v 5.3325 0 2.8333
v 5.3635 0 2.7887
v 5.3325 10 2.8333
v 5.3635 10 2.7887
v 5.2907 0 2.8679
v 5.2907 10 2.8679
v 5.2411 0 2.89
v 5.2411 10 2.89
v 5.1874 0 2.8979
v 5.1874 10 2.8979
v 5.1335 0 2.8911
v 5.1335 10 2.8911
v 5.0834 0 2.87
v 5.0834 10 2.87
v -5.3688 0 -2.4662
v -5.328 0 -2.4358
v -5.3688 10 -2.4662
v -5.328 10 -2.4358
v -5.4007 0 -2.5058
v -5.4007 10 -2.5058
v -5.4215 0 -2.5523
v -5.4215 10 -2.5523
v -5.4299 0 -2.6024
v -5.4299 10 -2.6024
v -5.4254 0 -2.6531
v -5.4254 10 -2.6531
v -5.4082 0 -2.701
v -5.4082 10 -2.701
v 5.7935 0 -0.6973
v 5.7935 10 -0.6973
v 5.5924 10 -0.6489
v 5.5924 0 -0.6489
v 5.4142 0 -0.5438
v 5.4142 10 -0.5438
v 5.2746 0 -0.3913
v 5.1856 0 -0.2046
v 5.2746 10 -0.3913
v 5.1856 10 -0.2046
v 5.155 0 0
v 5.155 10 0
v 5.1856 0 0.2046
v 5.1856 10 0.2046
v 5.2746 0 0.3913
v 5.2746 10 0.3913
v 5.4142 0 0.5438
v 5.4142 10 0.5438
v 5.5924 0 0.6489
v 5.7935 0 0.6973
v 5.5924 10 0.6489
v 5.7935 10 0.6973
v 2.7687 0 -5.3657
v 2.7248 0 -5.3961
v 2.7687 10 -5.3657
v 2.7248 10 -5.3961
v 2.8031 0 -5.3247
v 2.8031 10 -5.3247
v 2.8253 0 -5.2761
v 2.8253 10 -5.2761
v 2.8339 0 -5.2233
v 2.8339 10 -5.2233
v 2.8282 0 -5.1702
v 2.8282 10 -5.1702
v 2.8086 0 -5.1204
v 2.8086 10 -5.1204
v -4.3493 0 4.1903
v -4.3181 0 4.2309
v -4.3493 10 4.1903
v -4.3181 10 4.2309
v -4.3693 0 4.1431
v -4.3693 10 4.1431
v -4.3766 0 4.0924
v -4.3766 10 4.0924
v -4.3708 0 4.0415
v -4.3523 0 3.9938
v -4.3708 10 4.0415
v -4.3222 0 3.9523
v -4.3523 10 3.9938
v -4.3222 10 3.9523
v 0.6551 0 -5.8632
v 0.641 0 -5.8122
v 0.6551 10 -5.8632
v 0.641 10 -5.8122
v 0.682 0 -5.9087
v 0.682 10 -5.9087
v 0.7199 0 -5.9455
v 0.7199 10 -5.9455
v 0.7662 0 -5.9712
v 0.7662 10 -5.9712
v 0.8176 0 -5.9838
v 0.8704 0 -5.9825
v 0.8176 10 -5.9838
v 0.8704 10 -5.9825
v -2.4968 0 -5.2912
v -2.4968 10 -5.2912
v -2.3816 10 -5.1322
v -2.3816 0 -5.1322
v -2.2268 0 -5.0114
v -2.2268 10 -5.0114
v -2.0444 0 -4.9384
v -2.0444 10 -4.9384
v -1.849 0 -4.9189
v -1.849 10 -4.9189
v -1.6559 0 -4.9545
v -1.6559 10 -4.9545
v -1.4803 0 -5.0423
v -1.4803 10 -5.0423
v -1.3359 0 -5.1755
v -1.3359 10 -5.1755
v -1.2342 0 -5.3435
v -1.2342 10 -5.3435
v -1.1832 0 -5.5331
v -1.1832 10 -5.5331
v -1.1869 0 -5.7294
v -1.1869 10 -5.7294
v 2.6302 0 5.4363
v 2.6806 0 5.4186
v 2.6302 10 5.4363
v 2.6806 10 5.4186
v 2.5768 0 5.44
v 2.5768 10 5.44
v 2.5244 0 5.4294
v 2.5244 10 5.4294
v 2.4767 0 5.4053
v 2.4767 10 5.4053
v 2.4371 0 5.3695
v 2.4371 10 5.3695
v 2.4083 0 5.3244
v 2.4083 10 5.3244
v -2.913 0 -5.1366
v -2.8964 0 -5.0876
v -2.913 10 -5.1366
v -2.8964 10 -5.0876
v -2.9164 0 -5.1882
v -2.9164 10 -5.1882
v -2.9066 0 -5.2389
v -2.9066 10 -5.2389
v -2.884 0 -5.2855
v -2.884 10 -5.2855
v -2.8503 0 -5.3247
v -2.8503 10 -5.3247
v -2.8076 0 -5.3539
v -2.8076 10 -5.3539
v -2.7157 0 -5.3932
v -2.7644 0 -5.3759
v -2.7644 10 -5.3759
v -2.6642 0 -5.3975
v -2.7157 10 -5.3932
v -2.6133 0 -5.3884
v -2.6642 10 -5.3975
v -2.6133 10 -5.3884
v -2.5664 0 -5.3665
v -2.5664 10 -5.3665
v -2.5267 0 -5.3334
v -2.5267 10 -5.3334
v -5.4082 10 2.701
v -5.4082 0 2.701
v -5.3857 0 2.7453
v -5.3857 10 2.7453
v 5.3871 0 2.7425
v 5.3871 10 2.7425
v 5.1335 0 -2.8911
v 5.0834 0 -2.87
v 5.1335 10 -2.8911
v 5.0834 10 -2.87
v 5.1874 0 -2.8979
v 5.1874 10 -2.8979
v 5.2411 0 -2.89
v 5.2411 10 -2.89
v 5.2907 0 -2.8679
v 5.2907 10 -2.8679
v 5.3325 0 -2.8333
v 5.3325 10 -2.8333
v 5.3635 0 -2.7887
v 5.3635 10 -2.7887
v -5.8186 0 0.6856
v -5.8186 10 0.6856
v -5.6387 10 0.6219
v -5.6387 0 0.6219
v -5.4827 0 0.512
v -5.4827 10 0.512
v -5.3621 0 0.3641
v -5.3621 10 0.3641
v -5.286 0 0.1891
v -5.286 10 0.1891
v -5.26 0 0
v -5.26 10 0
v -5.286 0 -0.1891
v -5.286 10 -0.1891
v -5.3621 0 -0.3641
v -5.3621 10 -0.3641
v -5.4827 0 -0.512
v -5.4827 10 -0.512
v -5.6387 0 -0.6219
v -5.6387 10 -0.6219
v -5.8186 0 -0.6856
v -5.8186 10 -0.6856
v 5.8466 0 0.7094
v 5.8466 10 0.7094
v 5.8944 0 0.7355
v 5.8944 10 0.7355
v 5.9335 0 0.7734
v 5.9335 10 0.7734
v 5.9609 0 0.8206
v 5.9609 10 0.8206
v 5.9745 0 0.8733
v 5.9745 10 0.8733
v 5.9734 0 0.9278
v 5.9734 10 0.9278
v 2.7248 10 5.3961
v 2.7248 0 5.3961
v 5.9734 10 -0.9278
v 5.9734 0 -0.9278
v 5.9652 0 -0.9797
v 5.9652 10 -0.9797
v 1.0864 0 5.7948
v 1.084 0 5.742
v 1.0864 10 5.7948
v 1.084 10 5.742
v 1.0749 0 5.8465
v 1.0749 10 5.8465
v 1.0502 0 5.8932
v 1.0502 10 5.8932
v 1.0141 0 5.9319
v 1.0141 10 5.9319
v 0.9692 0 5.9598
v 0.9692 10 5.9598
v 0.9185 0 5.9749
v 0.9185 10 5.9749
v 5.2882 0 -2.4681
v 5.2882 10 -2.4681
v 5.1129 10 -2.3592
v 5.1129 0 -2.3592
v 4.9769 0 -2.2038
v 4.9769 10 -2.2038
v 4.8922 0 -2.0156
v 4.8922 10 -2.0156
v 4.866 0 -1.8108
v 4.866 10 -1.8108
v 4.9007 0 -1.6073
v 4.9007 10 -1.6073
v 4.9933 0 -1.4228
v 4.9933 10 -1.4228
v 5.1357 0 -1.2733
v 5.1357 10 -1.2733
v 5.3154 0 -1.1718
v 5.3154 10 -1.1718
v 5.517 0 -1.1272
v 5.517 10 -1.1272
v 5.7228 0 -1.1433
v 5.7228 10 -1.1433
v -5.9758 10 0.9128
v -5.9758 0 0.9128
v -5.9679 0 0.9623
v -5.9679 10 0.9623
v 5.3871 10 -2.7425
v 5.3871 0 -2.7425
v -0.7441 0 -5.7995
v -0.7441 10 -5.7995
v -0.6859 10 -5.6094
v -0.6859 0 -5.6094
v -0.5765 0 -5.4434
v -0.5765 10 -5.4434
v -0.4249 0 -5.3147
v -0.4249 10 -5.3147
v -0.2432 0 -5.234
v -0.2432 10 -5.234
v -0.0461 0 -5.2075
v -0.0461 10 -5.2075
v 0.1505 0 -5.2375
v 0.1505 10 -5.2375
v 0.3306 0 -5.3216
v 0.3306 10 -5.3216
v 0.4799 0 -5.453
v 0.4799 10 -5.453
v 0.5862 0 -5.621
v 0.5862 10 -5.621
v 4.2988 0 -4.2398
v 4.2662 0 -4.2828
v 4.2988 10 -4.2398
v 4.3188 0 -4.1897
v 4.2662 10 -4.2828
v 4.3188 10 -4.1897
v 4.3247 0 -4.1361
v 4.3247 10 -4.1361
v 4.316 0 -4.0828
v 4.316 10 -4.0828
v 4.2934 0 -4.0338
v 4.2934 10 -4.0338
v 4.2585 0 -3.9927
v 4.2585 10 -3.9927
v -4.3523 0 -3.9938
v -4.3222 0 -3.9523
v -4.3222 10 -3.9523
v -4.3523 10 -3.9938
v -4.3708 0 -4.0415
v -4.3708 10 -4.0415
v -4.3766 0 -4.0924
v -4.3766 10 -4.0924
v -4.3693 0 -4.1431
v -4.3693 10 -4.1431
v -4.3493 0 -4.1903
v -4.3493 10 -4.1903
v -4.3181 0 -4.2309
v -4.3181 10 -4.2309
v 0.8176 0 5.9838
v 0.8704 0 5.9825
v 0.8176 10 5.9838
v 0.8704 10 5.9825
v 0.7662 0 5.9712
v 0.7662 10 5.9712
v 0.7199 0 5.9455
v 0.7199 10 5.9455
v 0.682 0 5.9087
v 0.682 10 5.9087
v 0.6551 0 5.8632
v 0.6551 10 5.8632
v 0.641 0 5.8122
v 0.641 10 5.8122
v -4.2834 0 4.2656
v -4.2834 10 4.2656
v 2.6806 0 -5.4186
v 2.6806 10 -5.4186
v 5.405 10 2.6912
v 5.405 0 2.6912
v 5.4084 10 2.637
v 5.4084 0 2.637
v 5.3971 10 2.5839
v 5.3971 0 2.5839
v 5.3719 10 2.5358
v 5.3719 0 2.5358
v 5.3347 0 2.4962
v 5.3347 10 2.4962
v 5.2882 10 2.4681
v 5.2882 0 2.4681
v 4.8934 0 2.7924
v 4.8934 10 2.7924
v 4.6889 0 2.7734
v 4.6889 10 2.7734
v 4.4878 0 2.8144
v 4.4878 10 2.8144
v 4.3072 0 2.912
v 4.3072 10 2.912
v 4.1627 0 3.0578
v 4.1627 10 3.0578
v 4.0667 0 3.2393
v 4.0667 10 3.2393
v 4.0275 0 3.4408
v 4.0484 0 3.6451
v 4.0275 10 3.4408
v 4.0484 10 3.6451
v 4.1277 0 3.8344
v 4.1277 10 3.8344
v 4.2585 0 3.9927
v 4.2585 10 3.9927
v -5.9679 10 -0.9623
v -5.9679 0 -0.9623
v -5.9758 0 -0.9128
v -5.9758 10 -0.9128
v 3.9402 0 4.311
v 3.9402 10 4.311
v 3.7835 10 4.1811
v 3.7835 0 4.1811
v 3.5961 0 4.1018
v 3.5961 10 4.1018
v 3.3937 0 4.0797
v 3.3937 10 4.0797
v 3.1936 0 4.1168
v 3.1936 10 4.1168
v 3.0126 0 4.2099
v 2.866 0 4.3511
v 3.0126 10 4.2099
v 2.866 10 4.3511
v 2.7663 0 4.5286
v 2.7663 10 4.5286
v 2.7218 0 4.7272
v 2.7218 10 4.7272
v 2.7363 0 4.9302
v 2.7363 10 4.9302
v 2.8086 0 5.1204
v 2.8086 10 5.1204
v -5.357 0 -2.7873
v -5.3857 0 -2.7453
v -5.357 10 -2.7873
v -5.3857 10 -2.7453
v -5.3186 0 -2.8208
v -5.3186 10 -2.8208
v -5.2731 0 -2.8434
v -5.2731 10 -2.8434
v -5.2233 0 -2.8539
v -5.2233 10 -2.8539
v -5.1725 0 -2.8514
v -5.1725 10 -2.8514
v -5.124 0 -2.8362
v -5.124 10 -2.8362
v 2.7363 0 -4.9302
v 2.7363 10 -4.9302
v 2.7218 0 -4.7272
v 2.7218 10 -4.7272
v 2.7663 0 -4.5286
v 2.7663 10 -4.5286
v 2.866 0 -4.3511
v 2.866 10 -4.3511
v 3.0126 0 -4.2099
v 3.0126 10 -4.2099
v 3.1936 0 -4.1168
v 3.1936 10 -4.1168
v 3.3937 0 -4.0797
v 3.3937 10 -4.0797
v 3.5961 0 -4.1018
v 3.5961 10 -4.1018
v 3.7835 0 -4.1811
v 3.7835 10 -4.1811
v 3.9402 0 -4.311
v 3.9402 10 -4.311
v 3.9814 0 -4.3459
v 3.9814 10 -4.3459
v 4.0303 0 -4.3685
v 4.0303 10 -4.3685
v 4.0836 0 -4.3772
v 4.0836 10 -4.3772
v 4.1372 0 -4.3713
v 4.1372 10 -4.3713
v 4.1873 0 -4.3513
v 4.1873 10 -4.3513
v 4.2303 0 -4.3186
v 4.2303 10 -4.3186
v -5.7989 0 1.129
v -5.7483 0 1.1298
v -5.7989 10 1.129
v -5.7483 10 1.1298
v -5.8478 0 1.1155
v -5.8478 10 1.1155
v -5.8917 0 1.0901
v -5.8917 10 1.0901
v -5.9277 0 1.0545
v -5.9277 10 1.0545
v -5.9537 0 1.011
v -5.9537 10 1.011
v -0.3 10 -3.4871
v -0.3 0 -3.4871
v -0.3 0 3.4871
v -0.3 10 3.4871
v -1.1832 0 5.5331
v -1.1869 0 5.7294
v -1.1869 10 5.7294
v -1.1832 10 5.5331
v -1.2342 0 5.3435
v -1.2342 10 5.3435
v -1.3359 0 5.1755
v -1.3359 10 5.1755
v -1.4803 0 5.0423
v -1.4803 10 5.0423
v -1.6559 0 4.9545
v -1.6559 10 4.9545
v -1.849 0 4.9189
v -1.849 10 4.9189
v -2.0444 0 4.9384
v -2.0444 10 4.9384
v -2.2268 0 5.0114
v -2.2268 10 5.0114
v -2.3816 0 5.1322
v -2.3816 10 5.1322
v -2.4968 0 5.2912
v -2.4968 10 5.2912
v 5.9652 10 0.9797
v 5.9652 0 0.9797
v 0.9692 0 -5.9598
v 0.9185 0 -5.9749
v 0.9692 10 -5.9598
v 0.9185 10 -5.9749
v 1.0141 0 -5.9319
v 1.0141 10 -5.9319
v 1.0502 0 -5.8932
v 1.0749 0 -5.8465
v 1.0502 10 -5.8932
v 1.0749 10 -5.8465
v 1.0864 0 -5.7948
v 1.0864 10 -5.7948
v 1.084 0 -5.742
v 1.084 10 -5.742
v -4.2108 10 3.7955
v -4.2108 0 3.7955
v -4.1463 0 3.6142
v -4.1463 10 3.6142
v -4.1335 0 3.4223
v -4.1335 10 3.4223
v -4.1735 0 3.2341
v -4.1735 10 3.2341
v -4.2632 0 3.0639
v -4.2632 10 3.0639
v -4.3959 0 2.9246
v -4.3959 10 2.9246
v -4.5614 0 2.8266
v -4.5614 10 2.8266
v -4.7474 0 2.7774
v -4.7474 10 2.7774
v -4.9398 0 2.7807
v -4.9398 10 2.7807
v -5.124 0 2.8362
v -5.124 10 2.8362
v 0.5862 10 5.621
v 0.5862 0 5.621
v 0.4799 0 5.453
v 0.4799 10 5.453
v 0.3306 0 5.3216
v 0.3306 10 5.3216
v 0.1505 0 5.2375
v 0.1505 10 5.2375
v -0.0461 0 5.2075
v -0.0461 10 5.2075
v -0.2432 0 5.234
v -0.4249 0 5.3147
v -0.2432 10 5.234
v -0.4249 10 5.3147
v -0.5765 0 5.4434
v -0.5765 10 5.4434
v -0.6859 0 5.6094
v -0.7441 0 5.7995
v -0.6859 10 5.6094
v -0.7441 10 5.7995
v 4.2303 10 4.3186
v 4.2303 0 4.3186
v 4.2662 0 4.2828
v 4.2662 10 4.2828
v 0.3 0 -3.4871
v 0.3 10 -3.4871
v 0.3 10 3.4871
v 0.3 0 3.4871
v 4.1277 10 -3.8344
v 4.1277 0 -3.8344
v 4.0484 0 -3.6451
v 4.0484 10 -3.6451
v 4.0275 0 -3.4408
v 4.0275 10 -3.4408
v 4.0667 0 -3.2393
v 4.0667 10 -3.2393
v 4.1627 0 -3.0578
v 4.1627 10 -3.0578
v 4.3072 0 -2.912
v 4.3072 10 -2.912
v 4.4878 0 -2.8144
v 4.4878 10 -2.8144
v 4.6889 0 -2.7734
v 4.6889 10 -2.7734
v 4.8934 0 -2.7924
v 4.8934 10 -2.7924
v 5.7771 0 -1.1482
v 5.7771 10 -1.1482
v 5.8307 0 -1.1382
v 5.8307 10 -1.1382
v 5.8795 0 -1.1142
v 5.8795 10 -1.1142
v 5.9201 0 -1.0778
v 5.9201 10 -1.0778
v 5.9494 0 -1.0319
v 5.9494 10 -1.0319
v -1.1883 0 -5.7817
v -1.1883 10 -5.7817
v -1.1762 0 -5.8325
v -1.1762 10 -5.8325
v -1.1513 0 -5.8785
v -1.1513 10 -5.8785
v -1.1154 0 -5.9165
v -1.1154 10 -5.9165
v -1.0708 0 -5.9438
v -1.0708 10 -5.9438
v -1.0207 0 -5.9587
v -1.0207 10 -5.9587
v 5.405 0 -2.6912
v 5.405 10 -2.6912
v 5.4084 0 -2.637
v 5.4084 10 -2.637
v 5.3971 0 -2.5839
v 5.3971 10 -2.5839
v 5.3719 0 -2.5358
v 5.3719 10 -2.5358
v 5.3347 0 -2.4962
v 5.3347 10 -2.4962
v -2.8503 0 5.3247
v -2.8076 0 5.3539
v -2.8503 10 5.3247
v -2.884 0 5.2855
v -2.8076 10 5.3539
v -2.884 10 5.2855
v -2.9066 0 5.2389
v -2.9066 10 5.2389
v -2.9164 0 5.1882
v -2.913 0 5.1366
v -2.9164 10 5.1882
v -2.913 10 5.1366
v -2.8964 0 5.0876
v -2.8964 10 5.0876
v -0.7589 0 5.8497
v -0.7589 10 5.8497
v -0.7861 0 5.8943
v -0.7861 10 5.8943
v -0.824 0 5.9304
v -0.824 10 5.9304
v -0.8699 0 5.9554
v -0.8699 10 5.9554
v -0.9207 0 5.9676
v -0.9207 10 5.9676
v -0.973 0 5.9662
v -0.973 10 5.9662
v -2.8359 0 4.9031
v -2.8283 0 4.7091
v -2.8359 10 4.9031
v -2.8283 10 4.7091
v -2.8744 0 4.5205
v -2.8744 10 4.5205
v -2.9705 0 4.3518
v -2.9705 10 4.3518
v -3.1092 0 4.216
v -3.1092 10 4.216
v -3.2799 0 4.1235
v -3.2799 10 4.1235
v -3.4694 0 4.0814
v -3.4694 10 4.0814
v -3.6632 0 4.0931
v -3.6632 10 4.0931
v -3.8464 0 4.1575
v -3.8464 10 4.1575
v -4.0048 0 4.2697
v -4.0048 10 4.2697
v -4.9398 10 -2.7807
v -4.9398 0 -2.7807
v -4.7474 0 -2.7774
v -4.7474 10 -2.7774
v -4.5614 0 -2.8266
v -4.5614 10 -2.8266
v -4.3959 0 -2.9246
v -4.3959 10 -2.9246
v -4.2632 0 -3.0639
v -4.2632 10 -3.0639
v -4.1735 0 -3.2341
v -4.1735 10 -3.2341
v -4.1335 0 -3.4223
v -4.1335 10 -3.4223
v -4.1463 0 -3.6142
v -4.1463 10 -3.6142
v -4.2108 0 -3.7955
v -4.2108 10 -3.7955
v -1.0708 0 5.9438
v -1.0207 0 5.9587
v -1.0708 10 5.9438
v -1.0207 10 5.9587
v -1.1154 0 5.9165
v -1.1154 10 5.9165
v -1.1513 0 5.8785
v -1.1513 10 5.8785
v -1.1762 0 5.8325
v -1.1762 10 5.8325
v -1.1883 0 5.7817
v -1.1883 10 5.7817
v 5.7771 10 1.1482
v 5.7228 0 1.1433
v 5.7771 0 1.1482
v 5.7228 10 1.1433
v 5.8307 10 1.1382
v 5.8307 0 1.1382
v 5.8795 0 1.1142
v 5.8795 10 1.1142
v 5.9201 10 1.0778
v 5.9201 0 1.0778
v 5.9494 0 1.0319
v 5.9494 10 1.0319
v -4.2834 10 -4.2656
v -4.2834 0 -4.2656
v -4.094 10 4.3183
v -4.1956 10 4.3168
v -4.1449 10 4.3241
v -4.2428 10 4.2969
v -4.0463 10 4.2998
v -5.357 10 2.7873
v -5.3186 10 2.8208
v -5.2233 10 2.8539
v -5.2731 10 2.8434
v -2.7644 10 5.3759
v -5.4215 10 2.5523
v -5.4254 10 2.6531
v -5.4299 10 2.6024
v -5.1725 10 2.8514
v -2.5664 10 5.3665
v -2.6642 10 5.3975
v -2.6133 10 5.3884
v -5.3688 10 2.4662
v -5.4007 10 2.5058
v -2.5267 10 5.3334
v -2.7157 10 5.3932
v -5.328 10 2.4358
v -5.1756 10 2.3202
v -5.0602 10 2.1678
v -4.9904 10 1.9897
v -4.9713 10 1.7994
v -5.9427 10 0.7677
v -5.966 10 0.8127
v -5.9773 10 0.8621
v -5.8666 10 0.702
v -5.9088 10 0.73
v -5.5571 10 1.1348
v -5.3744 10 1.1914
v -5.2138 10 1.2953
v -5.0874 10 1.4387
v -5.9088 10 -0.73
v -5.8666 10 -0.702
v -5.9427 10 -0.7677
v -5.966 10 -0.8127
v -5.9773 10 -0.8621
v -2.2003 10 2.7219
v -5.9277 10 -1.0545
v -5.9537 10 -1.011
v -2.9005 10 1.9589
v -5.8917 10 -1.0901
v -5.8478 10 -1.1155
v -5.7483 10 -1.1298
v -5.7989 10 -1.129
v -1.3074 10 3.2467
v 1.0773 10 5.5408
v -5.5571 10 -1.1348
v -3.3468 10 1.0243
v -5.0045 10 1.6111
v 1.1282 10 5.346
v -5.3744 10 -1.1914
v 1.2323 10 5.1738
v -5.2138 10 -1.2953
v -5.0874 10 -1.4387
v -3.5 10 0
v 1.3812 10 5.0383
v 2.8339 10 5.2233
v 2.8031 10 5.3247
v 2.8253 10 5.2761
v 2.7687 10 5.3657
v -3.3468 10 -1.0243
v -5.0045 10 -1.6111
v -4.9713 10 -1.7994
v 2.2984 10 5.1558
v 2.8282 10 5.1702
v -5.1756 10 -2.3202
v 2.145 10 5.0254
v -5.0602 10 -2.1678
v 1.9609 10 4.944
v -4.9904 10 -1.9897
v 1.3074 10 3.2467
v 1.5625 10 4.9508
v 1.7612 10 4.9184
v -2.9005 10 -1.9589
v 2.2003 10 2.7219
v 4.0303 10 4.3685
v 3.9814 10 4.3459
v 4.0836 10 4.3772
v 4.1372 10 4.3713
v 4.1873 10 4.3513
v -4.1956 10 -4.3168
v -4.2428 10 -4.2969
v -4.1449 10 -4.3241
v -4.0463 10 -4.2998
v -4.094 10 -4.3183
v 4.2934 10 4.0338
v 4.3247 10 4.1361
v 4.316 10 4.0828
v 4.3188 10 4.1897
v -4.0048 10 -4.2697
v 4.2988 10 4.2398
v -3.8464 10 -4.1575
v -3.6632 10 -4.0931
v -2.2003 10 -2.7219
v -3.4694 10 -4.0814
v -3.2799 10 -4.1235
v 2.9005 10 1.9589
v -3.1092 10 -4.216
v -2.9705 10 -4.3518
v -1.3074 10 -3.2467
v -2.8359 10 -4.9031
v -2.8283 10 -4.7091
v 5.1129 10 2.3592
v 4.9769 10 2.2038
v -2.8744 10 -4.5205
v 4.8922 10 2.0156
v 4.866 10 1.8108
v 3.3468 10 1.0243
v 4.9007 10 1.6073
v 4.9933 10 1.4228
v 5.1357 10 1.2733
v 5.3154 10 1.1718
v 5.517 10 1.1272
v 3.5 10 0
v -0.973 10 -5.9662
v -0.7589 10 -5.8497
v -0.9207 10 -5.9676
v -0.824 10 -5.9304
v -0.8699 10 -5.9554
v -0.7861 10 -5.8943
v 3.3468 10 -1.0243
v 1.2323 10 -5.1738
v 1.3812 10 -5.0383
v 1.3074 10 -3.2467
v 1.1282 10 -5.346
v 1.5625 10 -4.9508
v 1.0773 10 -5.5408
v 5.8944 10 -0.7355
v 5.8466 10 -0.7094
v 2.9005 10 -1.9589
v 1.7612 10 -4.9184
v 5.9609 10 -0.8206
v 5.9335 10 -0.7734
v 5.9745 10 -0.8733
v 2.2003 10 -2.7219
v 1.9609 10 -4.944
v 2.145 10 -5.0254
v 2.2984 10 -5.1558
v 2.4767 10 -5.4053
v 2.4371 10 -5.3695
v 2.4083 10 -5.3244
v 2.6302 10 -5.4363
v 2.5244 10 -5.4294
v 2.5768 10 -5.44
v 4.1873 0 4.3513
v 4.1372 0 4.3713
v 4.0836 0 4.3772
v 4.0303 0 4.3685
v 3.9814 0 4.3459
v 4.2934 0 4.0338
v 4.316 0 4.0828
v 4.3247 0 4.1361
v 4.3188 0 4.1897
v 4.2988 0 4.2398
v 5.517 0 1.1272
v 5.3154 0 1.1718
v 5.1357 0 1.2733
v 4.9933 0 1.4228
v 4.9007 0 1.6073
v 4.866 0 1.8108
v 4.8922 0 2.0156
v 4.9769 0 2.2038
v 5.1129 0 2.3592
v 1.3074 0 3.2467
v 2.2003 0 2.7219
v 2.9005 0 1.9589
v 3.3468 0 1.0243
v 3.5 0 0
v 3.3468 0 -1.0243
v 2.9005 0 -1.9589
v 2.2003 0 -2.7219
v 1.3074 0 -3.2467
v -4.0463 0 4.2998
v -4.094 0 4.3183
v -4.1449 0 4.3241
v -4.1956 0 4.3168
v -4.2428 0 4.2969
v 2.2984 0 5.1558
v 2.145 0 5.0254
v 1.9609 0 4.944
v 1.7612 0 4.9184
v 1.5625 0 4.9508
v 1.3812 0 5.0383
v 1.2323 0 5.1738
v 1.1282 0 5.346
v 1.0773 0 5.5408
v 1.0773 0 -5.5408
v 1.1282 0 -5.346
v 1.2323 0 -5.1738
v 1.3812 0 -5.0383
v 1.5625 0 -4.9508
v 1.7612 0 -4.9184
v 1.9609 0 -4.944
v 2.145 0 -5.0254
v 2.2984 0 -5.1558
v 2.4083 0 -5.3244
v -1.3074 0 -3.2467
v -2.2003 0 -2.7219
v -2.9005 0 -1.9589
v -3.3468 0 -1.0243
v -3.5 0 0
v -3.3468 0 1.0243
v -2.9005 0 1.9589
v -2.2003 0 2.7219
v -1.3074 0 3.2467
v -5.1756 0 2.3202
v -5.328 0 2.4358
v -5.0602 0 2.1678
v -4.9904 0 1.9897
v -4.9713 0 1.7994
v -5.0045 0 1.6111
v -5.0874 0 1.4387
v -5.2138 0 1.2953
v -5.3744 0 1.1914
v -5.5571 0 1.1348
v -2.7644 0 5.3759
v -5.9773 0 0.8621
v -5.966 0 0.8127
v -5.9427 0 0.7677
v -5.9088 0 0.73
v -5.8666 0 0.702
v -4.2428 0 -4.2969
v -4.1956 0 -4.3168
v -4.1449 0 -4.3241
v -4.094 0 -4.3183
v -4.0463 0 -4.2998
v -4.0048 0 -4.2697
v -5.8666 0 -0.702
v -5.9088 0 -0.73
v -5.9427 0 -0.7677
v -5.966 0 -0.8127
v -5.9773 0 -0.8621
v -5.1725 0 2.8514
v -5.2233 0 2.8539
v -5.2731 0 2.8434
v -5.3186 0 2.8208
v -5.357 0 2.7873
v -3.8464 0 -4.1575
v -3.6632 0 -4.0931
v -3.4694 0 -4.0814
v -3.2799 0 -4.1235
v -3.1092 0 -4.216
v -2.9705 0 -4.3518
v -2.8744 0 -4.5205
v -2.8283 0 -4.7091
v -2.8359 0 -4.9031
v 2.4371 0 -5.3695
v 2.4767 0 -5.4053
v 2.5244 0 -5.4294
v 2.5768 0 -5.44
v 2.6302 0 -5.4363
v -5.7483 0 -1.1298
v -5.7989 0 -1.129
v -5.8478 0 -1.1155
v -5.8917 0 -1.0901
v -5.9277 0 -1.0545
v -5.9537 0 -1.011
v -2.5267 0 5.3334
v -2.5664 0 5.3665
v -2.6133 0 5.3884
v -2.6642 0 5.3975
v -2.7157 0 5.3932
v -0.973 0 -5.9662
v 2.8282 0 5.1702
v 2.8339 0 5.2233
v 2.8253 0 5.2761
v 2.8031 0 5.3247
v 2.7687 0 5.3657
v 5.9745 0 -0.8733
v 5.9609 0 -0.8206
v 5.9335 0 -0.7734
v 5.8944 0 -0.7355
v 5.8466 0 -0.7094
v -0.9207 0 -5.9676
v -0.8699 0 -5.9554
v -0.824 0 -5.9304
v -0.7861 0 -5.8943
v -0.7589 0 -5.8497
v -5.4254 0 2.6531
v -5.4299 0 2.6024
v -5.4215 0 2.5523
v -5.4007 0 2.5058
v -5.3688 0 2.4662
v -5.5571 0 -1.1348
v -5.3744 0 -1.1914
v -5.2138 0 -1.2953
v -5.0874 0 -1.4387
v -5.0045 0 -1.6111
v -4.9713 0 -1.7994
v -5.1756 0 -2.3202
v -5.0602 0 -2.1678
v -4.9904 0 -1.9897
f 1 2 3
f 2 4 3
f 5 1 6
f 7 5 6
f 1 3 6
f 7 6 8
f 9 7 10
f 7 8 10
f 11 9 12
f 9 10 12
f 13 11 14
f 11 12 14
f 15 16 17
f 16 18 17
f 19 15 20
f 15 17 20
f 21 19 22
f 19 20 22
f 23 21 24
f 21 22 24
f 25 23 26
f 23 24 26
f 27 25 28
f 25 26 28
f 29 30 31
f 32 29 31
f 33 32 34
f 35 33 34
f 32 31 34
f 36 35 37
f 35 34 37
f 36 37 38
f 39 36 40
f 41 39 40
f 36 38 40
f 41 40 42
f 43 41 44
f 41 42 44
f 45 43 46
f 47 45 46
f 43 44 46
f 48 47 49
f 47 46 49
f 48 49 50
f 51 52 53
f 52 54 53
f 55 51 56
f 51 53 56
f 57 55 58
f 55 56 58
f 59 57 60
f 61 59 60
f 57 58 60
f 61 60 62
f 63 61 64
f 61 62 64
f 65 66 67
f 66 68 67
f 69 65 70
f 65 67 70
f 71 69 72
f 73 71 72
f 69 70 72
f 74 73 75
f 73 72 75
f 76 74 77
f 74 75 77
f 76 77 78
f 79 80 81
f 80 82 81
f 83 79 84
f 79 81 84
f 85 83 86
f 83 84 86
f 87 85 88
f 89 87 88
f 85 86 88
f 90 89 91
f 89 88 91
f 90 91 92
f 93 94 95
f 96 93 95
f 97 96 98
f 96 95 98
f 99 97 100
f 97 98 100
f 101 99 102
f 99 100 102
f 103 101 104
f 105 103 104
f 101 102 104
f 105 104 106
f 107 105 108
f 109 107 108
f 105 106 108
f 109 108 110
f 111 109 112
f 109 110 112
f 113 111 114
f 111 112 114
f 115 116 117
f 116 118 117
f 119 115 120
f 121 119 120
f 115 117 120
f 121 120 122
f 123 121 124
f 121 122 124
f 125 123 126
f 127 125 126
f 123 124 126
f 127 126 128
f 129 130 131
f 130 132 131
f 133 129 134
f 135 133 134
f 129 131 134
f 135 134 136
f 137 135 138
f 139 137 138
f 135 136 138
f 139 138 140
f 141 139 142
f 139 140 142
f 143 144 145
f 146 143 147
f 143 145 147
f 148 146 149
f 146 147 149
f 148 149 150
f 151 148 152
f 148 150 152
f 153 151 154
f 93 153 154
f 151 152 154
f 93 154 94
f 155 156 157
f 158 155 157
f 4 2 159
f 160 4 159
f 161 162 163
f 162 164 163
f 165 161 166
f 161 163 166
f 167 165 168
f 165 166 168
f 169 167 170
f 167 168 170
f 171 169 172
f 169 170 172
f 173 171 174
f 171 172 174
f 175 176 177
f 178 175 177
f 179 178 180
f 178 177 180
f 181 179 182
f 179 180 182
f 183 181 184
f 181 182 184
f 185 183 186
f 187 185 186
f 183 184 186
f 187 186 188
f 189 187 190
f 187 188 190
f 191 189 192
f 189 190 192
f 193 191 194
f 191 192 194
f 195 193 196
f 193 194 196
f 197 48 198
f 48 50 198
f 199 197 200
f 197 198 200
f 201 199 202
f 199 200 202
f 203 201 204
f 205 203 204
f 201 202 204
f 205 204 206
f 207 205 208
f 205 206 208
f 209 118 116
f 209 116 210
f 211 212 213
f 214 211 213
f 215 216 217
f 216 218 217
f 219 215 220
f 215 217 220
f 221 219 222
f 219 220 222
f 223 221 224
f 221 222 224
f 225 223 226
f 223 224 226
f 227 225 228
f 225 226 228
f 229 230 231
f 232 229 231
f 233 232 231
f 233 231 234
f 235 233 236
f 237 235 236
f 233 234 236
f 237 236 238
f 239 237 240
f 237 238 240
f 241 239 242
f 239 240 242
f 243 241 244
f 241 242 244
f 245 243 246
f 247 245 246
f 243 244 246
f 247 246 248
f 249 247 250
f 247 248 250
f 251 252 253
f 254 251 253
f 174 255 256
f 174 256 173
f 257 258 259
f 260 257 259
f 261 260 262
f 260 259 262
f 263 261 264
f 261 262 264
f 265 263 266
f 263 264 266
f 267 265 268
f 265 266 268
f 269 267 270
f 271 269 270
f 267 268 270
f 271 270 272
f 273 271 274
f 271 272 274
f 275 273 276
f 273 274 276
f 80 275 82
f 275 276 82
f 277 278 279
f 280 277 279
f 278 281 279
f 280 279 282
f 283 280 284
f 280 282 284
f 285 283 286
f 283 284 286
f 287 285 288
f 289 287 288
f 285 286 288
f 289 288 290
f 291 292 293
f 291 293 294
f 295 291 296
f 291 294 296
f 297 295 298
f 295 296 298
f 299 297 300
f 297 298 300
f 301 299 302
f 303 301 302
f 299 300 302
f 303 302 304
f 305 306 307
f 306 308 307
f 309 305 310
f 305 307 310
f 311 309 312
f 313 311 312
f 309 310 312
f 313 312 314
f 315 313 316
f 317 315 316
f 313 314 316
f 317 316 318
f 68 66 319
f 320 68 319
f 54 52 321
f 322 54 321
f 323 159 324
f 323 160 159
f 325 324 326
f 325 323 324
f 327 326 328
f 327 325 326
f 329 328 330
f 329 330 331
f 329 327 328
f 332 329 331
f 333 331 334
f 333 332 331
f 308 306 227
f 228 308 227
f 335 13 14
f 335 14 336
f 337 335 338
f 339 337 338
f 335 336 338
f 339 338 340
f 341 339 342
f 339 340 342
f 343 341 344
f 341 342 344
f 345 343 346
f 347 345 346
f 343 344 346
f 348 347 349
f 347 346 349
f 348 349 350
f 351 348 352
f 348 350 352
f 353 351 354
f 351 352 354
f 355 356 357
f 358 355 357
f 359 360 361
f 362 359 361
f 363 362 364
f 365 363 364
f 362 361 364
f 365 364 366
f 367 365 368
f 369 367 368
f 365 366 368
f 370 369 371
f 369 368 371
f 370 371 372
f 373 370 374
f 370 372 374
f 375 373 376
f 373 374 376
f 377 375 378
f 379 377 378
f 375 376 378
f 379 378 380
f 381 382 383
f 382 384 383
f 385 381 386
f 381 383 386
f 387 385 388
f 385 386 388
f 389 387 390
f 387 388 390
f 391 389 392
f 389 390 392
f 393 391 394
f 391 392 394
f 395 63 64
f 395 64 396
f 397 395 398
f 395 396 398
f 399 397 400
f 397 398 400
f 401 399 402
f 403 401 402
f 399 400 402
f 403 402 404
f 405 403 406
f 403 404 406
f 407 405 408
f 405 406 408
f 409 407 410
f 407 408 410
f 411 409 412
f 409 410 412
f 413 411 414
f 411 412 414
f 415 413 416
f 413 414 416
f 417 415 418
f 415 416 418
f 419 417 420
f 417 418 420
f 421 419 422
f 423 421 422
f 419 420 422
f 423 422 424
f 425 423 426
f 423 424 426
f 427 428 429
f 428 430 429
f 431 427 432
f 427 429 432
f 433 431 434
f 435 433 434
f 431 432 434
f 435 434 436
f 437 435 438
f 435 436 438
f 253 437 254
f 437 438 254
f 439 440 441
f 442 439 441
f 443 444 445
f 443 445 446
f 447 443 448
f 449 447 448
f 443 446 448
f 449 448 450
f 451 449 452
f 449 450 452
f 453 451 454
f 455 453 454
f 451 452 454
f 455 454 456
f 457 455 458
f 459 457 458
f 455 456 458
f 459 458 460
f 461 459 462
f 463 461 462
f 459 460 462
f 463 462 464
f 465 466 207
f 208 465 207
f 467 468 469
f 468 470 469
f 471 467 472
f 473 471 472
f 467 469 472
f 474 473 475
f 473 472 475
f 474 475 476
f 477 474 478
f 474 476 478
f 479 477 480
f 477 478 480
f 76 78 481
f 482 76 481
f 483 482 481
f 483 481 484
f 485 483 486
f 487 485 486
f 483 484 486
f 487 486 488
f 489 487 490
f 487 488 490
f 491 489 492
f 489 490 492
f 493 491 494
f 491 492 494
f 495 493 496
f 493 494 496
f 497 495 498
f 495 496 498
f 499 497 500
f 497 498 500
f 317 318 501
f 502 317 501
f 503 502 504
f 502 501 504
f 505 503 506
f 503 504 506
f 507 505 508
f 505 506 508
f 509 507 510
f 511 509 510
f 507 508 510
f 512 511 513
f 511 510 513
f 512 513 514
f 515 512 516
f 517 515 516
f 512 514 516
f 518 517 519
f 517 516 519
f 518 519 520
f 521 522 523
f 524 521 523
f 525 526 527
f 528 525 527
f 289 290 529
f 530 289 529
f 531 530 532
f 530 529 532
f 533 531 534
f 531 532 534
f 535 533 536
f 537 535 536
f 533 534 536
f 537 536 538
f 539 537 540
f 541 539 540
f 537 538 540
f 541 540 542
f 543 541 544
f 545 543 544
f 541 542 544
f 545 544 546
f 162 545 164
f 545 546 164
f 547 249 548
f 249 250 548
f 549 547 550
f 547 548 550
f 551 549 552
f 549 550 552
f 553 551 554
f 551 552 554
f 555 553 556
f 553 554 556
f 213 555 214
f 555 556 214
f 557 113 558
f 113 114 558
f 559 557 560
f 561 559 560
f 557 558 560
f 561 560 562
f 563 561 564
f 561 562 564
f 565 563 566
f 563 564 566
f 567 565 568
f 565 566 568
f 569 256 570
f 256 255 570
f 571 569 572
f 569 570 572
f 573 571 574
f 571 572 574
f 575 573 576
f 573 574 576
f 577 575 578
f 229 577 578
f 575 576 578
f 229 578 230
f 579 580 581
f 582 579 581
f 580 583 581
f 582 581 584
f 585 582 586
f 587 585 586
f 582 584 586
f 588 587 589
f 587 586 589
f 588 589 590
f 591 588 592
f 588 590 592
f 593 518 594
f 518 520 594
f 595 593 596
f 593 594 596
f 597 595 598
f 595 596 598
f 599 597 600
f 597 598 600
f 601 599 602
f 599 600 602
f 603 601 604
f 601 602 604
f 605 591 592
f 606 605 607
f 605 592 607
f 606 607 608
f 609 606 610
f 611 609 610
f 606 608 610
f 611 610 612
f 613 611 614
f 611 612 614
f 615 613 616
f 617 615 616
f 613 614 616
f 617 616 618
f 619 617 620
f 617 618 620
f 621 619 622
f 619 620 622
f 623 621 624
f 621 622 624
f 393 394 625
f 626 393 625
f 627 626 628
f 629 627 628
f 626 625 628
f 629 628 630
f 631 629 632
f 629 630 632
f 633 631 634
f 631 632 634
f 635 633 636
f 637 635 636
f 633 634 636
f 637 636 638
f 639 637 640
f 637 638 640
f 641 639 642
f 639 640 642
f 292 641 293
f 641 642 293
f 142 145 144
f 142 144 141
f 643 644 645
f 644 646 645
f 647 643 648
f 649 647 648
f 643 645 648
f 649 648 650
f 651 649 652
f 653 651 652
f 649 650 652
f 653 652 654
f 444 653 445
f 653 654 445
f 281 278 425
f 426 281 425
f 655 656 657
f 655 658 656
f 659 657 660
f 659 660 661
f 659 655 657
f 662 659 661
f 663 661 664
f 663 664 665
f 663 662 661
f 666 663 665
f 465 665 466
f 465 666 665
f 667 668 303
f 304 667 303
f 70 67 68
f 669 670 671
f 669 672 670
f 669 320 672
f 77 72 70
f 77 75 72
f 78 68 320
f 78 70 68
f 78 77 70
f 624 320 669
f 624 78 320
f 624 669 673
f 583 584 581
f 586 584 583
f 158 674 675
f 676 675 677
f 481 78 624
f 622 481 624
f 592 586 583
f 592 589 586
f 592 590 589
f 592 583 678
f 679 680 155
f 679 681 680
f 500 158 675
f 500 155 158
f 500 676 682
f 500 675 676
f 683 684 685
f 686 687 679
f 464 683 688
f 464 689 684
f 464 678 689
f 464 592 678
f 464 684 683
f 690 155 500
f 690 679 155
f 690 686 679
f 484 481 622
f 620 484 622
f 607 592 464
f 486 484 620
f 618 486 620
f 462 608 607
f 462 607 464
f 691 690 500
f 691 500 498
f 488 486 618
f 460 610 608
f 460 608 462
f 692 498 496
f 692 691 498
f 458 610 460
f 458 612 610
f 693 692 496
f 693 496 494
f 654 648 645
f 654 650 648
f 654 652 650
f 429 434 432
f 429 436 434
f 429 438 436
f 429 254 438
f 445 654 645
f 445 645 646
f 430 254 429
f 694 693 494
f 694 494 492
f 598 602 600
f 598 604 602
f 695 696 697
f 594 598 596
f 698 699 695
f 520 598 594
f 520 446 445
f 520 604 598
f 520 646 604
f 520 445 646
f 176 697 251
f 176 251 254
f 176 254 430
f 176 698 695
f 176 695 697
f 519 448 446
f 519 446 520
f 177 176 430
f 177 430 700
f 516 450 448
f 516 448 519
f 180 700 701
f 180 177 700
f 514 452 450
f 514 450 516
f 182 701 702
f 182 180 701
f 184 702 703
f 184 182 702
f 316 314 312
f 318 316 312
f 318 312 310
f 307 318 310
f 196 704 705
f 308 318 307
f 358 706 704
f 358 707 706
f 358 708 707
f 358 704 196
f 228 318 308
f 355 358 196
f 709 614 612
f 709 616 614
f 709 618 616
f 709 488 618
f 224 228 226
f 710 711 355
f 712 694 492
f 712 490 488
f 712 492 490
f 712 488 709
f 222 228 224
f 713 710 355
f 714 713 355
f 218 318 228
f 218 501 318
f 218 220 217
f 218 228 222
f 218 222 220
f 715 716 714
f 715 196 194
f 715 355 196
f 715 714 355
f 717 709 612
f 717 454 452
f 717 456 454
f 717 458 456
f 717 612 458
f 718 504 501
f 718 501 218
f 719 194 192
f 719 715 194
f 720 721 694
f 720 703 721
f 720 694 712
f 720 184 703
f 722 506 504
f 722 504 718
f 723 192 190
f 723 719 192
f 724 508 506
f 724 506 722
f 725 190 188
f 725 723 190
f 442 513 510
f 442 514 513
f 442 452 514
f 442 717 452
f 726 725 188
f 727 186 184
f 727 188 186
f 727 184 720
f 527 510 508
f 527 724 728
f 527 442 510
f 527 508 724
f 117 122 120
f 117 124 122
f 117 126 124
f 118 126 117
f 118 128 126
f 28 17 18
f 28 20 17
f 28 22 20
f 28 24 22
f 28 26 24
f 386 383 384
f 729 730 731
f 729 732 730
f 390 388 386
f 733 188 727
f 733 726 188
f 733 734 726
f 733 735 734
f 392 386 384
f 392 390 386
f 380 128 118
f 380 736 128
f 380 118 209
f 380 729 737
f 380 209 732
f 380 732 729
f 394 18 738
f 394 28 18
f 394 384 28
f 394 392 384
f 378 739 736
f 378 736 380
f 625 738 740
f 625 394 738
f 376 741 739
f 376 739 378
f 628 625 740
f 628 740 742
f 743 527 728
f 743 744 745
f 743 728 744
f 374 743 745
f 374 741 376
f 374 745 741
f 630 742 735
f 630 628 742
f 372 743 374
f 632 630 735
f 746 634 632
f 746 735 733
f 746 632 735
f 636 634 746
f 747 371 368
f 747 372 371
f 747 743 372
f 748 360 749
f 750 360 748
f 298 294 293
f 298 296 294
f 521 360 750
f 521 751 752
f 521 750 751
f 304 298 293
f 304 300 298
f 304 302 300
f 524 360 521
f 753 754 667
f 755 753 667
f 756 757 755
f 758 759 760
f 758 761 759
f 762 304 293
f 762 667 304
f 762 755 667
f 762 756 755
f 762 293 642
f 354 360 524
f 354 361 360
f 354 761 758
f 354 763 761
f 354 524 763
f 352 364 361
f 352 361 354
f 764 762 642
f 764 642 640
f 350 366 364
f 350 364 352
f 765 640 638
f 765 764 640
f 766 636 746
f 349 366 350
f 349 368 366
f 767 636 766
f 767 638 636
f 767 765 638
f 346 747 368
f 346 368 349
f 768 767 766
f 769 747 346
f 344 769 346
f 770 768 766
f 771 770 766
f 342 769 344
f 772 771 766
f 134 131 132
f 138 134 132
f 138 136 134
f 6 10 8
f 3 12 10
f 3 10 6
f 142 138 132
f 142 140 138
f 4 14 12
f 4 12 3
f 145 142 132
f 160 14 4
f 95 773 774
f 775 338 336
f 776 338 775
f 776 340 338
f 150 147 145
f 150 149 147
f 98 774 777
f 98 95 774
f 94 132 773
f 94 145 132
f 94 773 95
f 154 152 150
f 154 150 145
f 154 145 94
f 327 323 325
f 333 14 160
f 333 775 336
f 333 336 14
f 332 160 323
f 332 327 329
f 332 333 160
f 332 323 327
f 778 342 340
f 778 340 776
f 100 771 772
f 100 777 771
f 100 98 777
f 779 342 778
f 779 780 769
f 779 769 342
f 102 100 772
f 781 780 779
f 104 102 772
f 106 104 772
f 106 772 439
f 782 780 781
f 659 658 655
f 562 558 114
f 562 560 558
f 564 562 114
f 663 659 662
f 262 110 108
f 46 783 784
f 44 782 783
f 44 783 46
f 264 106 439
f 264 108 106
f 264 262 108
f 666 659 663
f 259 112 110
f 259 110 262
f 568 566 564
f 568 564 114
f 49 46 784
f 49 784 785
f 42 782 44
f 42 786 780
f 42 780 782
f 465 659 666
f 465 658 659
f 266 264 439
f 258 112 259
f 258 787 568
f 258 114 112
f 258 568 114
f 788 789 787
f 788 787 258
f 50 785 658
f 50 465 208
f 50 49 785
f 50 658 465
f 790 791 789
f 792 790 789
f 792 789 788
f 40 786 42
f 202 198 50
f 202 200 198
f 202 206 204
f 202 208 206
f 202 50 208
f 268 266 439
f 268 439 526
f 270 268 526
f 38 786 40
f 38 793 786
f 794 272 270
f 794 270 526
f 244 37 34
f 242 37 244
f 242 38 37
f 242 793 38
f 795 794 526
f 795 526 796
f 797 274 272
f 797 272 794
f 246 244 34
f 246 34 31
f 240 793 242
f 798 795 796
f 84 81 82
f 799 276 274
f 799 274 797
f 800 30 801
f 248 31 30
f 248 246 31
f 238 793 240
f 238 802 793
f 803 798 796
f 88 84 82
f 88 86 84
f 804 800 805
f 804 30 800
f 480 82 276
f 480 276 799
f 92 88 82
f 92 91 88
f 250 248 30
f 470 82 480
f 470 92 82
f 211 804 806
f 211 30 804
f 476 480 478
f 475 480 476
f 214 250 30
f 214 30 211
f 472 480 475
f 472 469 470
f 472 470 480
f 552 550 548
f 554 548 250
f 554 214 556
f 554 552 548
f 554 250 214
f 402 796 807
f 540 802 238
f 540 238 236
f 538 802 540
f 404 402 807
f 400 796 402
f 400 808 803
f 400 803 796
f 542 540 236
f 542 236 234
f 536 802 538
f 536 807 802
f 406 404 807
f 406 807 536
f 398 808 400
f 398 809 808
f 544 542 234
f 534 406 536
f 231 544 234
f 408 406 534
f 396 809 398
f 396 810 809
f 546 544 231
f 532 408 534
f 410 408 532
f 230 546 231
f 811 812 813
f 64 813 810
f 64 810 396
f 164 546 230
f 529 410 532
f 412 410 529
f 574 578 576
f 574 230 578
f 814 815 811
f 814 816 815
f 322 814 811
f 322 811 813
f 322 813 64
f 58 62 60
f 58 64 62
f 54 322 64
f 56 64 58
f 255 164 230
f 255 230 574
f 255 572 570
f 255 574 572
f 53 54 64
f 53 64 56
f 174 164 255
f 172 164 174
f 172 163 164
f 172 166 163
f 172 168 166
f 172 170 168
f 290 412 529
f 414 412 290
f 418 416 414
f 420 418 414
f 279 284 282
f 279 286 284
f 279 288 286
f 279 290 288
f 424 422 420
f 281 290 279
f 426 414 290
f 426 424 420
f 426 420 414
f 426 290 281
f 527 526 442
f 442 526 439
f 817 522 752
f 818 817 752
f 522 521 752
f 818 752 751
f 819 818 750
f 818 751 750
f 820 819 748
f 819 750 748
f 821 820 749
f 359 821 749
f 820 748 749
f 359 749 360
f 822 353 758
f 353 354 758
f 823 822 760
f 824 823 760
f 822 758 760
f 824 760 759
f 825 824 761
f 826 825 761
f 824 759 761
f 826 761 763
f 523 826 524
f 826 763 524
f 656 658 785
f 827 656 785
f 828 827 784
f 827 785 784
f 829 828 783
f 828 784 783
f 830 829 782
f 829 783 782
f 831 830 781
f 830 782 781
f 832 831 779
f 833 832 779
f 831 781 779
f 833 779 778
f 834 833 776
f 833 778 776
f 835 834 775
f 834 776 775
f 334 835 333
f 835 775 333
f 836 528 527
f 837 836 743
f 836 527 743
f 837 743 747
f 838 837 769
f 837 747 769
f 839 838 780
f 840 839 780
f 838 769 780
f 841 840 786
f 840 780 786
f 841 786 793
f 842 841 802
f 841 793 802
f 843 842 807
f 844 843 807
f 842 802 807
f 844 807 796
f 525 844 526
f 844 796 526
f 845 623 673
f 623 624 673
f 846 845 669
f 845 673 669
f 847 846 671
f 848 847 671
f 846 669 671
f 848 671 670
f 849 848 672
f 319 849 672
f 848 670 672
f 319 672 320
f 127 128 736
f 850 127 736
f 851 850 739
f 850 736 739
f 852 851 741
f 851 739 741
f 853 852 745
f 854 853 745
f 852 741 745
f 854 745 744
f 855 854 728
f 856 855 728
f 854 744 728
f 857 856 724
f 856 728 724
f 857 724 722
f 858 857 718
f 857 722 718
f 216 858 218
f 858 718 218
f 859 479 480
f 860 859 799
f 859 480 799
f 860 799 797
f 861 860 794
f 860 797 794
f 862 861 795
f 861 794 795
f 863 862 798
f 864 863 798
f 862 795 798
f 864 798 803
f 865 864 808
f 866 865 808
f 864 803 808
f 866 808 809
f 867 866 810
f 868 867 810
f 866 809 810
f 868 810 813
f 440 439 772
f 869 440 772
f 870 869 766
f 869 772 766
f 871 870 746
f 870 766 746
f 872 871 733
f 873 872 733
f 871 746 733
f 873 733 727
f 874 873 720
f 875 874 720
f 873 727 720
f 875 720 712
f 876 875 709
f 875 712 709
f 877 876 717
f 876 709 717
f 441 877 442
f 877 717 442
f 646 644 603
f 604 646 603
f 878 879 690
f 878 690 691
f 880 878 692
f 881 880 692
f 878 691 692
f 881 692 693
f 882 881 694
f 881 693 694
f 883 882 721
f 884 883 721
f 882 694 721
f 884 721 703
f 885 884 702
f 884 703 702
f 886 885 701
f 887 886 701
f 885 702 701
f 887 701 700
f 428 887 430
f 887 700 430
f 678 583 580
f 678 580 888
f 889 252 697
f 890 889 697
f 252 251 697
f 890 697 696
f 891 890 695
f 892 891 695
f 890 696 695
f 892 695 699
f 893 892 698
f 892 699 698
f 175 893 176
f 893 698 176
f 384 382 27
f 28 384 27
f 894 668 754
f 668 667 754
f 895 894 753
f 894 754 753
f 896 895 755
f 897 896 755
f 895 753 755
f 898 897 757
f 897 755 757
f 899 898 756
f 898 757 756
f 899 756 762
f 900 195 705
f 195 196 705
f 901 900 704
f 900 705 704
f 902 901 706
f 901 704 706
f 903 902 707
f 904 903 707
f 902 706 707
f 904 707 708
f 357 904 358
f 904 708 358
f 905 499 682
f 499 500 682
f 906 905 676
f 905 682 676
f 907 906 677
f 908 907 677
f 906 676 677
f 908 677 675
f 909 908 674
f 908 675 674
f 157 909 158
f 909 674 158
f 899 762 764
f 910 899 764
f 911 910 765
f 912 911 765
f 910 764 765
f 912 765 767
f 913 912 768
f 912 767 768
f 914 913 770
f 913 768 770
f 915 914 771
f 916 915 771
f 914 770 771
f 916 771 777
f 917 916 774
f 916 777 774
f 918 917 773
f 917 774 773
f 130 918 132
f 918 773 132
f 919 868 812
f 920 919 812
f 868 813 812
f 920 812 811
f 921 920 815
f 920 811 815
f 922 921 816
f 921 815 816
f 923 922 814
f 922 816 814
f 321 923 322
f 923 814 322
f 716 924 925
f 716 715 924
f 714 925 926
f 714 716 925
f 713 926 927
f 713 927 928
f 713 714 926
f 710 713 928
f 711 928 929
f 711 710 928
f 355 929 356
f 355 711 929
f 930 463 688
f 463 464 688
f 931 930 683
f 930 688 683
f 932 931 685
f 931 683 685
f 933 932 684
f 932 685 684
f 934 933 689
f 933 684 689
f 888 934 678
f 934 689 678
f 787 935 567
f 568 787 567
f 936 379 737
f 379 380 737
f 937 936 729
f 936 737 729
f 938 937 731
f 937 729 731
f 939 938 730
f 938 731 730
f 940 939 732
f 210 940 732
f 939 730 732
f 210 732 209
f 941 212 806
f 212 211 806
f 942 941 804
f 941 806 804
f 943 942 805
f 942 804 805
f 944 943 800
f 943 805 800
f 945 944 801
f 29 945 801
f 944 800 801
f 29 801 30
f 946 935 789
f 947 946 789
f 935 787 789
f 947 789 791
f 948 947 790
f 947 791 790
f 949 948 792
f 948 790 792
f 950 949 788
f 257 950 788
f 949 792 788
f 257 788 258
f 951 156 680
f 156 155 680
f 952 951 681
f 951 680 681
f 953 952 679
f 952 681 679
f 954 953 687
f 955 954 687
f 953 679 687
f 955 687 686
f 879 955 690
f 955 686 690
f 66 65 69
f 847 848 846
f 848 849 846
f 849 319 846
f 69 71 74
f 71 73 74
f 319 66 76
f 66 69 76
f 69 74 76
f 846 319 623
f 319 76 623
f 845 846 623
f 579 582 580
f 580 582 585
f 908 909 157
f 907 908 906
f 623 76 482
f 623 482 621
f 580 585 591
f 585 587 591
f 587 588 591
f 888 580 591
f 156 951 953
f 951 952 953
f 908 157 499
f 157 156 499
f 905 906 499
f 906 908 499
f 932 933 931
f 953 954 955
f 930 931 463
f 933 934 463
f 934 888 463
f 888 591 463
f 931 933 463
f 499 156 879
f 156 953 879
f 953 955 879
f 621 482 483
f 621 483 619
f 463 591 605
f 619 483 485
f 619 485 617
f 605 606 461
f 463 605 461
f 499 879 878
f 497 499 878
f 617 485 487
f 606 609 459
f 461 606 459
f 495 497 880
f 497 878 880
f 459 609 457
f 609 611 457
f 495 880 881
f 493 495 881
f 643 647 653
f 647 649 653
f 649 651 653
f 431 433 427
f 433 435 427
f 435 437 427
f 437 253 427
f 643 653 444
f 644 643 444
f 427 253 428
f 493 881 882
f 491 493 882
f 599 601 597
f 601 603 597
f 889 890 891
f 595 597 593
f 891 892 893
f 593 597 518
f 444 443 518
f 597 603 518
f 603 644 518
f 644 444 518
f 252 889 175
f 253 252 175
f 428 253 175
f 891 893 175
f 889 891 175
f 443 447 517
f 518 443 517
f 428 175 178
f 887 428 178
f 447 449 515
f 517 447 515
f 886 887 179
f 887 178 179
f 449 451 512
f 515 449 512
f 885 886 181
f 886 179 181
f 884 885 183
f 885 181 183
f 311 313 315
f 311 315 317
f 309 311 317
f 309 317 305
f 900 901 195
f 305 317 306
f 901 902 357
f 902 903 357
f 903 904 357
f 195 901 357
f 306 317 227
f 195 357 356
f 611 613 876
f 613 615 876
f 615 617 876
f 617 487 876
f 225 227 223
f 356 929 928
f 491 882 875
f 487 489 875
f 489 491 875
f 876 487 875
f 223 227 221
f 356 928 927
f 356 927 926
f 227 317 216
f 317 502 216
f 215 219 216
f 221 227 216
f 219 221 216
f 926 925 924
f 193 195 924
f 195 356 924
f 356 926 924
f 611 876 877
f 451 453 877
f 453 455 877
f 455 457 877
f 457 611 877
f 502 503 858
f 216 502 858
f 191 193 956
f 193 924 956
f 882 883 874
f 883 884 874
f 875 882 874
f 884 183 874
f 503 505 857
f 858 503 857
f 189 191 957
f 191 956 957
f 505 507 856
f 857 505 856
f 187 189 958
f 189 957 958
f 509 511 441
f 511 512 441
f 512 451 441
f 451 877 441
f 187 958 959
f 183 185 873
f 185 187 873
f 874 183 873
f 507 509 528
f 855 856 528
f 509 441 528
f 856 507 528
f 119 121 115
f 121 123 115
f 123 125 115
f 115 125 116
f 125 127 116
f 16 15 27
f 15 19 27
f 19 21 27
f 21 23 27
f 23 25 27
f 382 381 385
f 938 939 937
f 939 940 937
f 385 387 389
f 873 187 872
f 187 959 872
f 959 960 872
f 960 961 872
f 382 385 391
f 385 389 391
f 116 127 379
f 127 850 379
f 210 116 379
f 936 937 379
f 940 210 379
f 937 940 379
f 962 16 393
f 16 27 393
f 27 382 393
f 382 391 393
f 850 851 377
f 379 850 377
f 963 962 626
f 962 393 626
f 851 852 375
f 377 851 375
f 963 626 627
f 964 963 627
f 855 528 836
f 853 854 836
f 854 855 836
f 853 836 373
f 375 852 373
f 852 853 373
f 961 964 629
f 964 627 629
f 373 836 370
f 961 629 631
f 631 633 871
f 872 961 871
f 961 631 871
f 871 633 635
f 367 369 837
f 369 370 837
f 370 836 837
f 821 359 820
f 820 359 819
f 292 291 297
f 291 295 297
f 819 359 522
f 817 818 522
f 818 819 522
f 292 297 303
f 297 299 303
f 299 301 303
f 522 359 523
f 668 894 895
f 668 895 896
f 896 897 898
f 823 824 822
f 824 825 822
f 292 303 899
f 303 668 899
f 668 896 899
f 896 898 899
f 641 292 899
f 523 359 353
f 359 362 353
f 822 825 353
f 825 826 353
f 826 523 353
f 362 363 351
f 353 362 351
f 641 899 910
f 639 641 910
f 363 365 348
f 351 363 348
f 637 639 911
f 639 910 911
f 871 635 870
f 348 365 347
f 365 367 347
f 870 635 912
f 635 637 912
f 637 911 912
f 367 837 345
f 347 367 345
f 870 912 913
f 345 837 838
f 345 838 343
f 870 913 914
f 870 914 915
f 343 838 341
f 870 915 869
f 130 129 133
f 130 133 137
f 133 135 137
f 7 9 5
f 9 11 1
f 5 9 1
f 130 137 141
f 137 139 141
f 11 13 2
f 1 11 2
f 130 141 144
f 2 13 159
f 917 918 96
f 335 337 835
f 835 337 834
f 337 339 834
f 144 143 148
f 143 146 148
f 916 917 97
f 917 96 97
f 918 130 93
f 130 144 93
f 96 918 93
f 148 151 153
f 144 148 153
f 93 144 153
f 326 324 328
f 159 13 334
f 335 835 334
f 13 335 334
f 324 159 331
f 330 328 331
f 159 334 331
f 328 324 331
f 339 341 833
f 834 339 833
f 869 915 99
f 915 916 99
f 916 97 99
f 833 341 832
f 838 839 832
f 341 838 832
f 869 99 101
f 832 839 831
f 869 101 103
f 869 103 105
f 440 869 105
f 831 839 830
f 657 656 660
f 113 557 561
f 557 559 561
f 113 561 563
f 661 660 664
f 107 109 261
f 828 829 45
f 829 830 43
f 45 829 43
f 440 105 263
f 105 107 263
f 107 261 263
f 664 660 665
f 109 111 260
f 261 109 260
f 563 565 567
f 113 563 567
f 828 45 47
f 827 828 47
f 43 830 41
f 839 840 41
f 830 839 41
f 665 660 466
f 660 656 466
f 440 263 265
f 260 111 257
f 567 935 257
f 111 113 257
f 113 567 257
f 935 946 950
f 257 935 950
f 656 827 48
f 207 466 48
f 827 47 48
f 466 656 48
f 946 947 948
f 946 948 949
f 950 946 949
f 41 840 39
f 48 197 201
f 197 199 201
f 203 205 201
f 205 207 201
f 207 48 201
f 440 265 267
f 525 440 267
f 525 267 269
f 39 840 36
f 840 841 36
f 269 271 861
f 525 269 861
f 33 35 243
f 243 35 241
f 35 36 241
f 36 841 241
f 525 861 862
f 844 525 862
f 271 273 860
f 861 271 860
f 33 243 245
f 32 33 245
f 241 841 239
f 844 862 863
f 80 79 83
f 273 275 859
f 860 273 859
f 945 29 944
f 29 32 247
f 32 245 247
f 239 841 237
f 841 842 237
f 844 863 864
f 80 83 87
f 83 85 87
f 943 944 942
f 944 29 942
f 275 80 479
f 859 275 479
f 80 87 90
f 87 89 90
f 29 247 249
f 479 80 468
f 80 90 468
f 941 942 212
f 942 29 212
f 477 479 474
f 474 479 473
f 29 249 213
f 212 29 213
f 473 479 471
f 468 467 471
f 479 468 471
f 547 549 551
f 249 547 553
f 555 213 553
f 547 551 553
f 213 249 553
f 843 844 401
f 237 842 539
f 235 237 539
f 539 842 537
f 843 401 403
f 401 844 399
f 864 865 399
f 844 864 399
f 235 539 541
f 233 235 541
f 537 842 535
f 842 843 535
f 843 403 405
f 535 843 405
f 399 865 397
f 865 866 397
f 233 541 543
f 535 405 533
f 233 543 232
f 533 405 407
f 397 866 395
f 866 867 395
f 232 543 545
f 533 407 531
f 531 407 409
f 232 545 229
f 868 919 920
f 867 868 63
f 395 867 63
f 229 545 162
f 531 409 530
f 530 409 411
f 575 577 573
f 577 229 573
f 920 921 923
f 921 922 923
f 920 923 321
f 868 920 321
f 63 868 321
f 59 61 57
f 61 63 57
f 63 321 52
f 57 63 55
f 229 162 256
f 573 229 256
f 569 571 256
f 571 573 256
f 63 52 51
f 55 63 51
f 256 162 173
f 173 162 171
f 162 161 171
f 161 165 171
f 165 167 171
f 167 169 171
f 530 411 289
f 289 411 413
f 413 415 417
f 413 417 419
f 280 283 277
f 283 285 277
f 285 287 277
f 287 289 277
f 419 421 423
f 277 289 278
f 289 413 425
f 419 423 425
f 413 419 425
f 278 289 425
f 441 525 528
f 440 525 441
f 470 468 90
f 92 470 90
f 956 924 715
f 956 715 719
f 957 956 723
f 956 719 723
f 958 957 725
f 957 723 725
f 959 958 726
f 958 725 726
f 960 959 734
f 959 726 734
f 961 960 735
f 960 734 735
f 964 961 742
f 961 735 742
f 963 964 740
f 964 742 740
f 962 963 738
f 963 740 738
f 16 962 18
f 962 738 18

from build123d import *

# Parameters (mm, degrees)
BOSS_EXTRUDE1_DEPTH = 10
SKETCH2_R           = 0.7
CUT_EXTRUDE1_DEPTH  = 10
CIRPATTERN3_COUNT   = 20
FILLET1_R           = 0.2
CUT_EXTRUDE2_REACH  = 12
SKETCH3_R           = 3.5
SKETCH4_W           = 0.6
SKETCH4_H           = 10.414964042
BOSS_EXTRUDE2_DEPTH = 10


with BuildPart() as part:
    # Sketch1 → Boss-Extrude1 (new body)
    with BuildSketch(Plane(origin=(0, 0, 0), x_dir=(1, 0, 0), z_dir=(0, 1, 0))):
        Polygon((4.951468525, -3.59745246), (5.820800352, -1.891292682), (6.120351685, 0), (5.820800352, 1.891292682), (4.951468525, 3.59745246), (3.59745246, 4.951468525), (1.891292682, 5.820800352), (0, 6.120351685), (-1.891292682, 5.820800352), (-3.59745246, 4.951468525), (-4.951468525, 3.59745246), (-5.820800352, 1.891292682), (-6.120351685, 0), (-5.820800352, -1.891292682), (-4.951468525, -3.59745246), (-3.59745246, -4.951468525), (-1.891292682, -5.820800352), (0, -6.120351685), (1.891292682, -5.820800352), (3.59745246, -4.951468525), align=None)
    extrude(amount=BOSS_EXTRUDE1_DEPTH)

    # Sketch2 → Cut-Extrude1 (cut)
    with BuildSketch(Plane(origin=(0, 10, 0), x_dir=(1, 0, 0), z_dir=(0, 1, 0))):
        with Locations((5.855, 0)):
            Circle(SKETCH2_R)
    cut_extrude1 = extrude(amount=-CUT_EXTRUDE1_DEPTH, mode=Mode.SUBTRACT)

    # CirPattern3: Cut-Extrude1 ×20 about axis
    cirpattern3_axis = Axis((-0.052482021, 0, 0), (0, 1, 0))
    for i in range(1, CIRPATTERN3_COUNT):
        add(cut_extrude1.rotate(cirpattern3_axis, i * 360 / CIRPATTERN3_COUNT), mode=Mode.SUBTRACT)

    # Fillet1
    fillet1_edges = [part.edges().sort_by_distance(p)[0] for p in [
        (4.057798917, 5, -4.491122068),
        (2.93831654, 5, -5.287315051),
        (5.251367741, 5, -3.008867108),
        (4.438640047, 5, -4.110280937),
        (2.467098423, 5, -5.527412673),
        (1.150354408, 5, -5.938153446),
        (0.638542887, 5, -6.019216428),
        (-0.746045616, 5, -6.002189668),
        (-1.247642454, 5, -5.922744534),
        (-2.563808053, 5, -5.478136656),
        (-3.008267267, 5, -5.251673375),
        (-4.126835407, 5, -4.422085577),
        (-4.474567598, 5, -4.074353387),
        (-5.286407893, 5, -2.940096937),
        (-5.507494847, 5, -2.506189359),
        (-5.933957193, 5, -1.176848512),
        (-6.009763498, 5, -0.698226334),
        (-6.009763498, 5, 0.698226334),
        (-5.933957193, 5, 1.176848512),
        (-5.507494847, 5, 2.506189359),
        (-5.286407893, 5, 2.940096937),
        (-4.474567598, 5, 4.074353387),
        (-4.126835407, 5, 4.422085577),
        (-3.008267267, 5, 5.251673375),
        (-2.563808053, 5, 5.478136656),
        (-1.247642454, 5, 5.922744534),
        (-0.746045616, 5, 6.002189668),
        (0.638542887, 5, 6.019216428),
        (1.150354408, 5, 5.938153446),
        (2.467098423, 5, 5.527412673),
        (2.93831654, 5, 5.287315051),
        (4.057798917, 5, 4.491122068),
        (5.251367741, 5, 3.008867108),
        (4.438640047, 5, 4.110280937),
        (5.499267273, 5, 2.522336881),
        (5.926264611, 5, 1.225417561),
        (5.926264611, 5, -1.225417561),
        (5.499267273, 5, -2.522336881),
        (6.012318774, 5, 0.682092958),
        (6.012318774, 5, -0.682092958),
    ]]
    fillet(fillet1_edges, radius=FILLET1_R)

    # Sketch3 → Cut-Extrude2 (cut, up to next)
    with BuildSketch(Plane(origin=(0, 10, 0), x_dir=(1, 0, 0), z_dir=(0, 1, 0)), mode=Mode.PRIVATE) as cut_extrude2_sk1:
        with Locations(Location((0, 0, 0), (0, 0, 270))):  # turned: the seam where the file's is
            Circle(SKETCH3_R)
    cut_extrude2_tool1 = extrude(cut_extrude2_sk1.sketch, amount=-CUT_EXTRUDE2_REACH, mode=Mode.PRIVATE) & part.part
    add(cut_extrude2_tool1.solids().sort_by_distance((0, 10, 0))[0], mode=Mode.SUBTRACT)

    # Sketch4 → Boss-Extrude2 (add)
    with BuildSketch(Plane.XZ):
        Rectangle(SKETCH4_W, SKETCH4_H)
    extrude(amount=-BOSS_EXTRUDE2_DEPTH)


solid = part.part
